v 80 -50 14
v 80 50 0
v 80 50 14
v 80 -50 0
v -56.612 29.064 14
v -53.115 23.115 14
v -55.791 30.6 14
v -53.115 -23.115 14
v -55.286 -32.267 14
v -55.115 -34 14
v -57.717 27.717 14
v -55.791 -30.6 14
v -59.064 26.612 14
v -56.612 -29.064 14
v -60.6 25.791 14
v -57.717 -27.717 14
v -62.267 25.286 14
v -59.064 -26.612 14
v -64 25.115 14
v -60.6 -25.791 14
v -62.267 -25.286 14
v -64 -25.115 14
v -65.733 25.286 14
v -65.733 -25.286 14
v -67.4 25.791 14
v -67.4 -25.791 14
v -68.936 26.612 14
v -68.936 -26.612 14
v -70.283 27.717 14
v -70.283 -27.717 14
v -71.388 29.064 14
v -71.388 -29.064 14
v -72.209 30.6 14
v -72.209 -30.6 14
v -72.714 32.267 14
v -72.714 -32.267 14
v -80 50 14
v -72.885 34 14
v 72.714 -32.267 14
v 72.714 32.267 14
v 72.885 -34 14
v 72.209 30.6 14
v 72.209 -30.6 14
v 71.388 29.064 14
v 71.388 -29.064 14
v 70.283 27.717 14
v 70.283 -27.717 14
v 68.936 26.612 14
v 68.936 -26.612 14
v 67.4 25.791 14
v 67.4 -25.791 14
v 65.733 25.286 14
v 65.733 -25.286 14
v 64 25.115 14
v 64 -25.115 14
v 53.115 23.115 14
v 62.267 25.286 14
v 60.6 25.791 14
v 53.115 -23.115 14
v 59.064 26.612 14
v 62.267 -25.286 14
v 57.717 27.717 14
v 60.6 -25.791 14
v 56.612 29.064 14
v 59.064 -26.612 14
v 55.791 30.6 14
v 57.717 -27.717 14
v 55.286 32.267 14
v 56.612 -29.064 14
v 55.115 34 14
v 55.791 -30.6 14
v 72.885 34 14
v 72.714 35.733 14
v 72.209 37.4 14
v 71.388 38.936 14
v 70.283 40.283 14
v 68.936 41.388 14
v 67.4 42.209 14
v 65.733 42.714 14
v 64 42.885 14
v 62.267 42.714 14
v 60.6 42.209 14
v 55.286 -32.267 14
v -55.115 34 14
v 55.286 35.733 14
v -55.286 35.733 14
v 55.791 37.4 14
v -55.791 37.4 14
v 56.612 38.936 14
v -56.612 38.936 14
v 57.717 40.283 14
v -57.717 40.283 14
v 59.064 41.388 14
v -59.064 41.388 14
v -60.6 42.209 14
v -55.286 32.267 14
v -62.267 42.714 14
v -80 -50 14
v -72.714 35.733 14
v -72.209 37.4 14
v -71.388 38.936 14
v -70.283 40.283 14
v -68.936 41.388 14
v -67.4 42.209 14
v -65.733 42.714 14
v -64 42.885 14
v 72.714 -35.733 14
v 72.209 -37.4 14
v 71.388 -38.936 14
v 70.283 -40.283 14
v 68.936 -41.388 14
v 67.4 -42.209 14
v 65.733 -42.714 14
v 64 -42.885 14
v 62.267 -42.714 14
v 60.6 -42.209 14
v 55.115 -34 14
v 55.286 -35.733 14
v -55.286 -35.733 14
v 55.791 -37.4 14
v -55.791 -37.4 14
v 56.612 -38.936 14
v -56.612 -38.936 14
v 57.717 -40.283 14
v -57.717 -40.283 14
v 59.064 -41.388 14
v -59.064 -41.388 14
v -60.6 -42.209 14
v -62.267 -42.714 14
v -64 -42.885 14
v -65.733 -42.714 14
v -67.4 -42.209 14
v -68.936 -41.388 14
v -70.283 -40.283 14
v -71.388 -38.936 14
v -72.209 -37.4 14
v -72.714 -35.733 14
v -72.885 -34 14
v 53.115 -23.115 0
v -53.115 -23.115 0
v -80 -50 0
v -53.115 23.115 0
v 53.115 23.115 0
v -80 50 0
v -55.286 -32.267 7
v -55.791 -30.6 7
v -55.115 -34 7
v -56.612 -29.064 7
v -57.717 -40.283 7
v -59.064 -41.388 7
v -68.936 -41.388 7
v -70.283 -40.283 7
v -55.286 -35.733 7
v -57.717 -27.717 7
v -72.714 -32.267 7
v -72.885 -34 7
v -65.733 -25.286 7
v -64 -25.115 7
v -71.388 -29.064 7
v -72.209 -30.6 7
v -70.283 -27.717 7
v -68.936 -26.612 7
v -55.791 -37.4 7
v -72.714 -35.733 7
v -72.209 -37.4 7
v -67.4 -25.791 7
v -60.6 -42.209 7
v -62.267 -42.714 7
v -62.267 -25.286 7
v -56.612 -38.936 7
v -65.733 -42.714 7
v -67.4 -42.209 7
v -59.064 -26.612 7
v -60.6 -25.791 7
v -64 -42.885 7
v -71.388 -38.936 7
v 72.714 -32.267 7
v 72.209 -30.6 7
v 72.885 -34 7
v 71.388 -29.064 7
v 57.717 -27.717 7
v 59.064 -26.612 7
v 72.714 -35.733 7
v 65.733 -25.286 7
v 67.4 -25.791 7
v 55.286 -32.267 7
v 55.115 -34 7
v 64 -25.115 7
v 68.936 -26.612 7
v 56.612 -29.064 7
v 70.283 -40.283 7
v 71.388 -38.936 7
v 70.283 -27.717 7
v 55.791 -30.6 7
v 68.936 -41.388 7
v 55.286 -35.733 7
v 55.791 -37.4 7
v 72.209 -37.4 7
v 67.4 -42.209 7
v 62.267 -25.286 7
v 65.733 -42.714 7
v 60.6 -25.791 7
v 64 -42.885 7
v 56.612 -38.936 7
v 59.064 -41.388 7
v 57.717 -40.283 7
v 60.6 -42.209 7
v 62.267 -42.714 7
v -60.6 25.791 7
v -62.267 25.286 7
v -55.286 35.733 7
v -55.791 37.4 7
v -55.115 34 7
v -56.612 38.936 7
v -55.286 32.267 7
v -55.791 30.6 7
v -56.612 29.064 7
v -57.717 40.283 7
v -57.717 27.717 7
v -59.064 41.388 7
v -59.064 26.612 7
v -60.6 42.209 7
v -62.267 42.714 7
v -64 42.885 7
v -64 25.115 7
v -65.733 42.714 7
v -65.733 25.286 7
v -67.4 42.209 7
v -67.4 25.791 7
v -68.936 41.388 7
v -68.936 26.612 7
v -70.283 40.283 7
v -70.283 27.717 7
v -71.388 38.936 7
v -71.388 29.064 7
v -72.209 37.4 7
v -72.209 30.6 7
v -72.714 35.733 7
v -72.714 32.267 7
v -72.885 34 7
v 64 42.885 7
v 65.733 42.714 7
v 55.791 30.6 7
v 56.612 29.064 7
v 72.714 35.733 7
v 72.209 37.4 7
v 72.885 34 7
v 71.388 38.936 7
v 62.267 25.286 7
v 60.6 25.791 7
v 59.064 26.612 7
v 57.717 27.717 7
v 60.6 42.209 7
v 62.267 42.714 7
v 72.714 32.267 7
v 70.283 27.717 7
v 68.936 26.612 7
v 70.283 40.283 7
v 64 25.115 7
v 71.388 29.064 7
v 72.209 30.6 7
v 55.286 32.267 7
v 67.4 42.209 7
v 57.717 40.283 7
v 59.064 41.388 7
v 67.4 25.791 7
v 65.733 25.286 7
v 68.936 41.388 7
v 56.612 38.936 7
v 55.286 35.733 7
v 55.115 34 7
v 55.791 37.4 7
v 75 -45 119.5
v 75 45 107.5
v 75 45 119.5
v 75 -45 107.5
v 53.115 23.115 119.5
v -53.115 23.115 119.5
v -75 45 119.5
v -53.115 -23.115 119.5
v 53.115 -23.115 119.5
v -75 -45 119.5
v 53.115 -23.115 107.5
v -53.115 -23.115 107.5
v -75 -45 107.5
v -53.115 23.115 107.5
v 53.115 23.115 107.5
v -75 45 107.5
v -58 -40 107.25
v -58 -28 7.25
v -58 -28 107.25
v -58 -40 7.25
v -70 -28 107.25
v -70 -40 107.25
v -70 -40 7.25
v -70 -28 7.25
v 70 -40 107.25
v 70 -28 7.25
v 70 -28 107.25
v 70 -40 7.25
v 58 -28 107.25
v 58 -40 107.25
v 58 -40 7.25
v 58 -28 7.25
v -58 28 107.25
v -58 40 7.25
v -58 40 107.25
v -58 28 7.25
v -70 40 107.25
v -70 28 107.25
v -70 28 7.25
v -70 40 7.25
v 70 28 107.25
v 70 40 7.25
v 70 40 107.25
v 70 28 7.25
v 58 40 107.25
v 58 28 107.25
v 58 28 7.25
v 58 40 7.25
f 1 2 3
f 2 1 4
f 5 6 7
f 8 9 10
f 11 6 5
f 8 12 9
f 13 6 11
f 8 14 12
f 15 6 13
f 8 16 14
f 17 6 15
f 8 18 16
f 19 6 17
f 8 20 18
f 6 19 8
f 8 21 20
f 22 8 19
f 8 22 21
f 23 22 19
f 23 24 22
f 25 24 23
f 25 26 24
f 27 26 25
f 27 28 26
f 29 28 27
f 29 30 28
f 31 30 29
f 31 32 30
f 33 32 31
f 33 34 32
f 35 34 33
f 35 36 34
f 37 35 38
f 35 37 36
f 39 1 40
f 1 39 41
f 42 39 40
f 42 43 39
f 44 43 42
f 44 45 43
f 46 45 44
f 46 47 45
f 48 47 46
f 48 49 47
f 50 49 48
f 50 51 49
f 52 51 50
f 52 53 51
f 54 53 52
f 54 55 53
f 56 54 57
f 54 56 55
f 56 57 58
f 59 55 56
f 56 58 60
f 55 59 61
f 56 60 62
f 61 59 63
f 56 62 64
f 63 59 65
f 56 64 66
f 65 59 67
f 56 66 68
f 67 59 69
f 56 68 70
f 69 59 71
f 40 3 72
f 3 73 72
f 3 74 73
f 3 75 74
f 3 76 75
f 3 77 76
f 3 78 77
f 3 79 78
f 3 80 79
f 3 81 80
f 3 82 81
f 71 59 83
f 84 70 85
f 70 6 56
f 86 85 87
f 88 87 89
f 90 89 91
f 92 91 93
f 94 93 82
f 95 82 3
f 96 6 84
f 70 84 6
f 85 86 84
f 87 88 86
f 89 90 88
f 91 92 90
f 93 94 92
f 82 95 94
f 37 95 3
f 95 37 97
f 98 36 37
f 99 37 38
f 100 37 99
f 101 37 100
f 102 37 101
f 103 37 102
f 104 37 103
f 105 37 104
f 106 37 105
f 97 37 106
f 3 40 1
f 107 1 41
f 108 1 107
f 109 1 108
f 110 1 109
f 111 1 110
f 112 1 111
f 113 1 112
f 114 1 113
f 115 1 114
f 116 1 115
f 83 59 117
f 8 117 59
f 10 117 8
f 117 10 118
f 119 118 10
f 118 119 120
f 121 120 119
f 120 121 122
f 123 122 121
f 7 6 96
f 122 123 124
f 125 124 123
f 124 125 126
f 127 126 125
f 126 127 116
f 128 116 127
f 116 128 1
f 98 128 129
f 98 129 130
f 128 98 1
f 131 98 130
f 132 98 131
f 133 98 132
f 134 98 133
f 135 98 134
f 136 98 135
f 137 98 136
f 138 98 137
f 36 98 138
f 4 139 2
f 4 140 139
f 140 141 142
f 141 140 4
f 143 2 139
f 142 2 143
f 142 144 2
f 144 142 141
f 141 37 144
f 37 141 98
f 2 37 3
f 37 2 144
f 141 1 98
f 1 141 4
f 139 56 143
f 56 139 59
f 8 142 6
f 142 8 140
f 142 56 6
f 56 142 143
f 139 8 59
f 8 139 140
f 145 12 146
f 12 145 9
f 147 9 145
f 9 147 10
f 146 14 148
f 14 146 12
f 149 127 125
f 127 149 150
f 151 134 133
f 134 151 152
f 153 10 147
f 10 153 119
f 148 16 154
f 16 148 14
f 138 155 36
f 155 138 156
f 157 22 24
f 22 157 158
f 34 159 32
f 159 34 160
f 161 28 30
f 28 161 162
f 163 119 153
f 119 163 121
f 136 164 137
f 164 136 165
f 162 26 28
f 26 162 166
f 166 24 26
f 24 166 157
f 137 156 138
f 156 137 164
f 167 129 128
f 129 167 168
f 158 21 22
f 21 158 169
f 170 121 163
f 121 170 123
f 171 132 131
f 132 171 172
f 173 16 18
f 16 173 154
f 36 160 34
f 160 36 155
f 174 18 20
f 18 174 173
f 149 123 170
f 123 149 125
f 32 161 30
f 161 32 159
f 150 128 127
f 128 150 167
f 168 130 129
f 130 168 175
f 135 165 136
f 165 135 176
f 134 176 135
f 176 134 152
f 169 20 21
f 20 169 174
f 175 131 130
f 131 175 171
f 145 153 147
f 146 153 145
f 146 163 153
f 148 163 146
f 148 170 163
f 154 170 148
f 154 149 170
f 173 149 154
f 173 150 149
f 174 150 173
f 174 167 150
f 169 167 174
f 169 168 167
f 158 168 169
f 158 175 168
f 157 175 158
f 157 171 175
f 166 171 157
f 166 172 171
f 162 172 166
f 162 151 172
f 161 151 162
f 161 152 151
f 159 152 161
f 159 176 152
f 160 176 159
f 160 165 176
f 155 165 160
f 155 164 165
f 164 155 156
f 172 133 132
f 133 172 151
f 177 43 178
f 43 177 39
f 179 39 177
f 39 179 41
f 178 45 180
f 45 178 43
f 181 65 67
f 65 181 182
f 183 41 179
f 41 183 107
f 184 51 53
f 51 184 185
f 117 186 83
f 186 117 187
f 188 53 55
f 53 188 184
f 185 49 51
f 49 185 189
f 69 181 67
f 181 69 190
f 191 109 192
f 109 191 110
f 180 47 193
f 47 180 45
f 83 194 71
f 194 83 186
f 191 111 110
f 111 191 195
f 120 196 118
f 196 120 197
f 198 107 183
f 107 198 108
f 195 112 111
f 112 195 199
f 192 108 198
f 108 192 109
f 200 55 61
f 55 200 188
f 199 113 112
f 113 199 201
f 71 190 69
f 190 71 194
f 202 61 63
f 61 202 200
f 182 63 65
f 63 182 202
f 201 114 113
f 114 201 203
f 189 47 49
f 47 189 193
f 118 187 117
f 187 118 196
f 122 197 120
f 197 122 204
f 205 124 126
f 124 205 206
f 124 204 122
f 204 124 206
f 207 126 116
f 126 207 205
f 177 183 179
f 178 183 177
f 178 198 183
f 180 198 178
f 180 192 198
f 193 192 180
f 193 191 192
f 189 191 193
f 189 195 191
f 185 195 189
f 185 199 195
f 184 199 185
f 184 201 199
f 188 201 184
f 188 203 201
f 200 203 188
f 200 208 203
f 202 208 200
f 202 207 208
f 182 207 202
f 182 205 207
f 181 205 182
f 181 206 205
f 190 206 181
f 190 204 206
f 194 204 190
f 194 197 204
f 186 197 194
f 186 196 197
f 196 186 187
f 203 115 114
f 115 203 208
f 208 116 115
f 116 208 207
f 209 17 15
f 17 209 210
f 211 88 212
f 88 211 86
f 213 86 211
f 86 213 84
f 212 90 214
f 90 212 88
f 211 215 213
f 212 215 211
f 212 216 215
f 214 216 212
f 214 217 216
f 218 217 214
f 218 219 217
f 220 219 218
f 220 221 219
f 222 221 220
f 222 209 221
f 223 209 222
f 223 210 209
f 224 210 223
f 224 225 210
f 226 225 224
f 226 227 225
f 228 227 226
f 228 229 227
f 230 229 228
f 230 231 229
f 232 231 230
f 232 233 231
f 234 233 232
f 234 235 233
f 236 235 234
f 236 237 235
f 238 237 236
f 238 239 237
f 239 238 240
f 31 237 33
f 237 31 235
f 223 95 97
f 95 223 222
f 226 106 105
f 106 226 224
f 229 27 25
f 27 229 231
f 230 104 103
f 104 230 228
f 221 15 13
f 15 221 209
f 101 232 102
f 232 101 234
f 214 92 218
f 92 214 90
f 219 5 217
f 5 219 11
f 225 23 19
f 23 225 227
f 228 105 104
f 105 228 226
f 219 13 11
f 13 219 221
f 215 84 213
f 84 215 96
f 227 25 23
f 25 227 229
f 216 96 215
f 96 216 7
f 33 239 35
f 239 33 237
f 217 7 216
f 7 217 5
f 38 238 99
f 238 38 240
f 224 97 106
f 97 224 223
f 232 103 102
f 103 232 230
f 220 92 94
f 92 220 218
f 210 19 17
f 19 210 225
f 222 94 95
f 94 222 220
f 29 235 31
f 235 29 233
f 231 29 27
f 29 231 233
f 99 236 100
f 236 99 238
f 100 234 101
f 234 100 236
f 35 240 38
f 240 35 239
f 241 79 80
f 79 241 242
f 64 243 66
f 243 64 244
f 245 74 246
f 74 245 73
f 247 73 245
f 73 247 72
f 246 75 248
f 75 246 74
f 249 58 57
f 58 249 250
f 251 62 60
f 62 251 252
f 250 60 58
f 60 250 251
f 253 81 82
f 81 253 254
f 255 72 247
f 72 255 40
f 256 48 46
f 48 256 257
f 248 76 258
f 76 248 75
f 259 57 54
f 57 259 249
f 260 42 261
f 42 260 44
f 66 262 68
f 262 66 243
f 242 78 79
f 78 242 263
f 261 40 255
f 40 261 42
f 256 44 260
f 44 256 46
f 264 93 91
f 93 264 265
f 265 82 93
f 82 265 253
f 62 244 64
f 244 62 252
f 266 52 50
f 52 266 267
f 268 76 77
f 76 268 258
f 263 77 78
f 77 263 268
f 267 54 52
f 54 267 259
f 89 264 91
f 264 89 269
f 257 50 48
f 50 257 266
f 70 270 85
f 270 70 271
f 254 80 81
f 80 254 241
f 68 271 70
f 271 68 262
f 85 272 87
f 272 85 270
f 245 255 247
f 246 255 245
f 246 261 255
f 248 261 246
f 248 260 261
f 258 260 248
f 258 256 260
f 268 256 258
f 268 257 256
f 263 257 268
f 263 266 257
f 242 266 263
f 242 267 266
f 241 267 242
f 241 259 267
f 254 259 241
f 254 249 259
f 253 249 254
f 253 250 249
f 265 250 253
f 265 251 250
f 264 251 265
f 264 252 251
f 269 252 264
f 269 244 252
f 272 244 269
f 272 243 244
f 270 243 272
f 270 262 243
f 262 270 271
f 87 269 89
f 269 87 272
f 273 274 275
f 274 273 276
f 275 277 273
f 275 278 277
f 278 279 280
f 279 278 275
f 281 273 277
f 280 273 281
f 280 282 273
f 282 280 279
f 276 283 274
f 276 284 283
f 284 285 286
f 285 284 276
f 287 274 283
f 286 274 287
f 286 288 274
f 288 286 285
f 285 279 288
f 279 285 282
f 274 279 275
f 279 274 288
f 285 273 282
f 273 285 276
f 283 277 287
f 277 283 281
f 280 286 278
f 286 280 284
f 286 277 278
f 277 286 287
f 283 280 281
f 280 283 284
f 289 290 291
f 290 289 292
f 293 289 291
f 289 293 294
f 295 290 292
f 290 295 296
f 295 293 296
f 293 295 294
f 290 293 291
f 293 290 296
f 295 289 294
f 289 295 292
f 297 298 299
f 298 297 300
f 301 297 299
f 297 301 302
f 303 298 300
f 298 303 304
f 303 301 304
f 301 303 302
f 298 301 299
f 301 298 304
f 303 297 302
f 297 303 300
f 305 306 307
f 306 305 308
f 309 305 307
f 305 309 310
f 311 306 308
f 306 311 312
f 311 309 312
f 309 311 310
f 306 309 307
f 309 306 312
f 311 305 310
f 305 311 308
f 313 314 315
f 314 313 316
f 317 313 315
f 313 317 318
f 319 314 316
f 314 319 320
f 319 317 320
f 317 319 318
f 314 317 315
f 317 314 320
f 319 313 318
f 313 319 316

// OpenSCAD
$fn = 32;

// ------------------------------------------------------------------------
// Frame cube: base 160 x 100 mm, posts 100 mm tall
// Every part is its own module, assembly() places every instance.
// ------------------------------------------------------------------------

// --- part 1 ---
module base_frame() {
  difference() {
    translate([-80, -50, 0]) cube([160, 100, 14]);
    translate([-53.115, -23.115, -1]) cube([106.23, 46.23, 16]);
    translate([-64, -34, 7]) cylinder(h = 8, d = 17.77);
    translate([64, -34, 7]) cylinder(h = 8, d = 17.77);
    translate([-64, 34, 7]) cylinder(h = 8, d = 17.77);
    translate([64, 34, 7]) cylinder(h = 8, d = 17.77);
  }
}

// --- part 2 ---
module corner_post() {
  translate([-6, -6, 0]) cube([12, 12, 100]);
}

// --- part 3 ---
module top_frame() {
  difference() {
    translate([-75, -45, 0]) cube([150, 90, 12]);
    translate([-53.115, -23.115, -1]) cube([106.23, 46.23, 14]);
  }
}

// --- assembly ---
module assembly() {
  color([0.80, 0.24, 0.20]) translate([0, 0, 0]) rotate([0, 0, 0]) base_frame();
  color([0.20, 0.45, 0.75]) translate([-64, -34, 7.25]) rotate([0, 0, 0]) corner_post();
  color([0.25, 0.62, 0.32]) translate([64, -34, 7.25]) rotate([0, 0, 0]) corner_post();
  color([0.92, 0.70, 0.18]) translate([-64, 34, 7.25]) rotate([0, 0, 0]) corner_post();
  color([0.58, 0.35, 0.70]) translate([64, 34, 7.25]) rotate([0, 0, 0]) corner_post();
  color([0.16, 0.66, 0.66]) translate([0, 0, 107.5]) rotate([0, 0, 0]) top_frame();
}

assembly();
